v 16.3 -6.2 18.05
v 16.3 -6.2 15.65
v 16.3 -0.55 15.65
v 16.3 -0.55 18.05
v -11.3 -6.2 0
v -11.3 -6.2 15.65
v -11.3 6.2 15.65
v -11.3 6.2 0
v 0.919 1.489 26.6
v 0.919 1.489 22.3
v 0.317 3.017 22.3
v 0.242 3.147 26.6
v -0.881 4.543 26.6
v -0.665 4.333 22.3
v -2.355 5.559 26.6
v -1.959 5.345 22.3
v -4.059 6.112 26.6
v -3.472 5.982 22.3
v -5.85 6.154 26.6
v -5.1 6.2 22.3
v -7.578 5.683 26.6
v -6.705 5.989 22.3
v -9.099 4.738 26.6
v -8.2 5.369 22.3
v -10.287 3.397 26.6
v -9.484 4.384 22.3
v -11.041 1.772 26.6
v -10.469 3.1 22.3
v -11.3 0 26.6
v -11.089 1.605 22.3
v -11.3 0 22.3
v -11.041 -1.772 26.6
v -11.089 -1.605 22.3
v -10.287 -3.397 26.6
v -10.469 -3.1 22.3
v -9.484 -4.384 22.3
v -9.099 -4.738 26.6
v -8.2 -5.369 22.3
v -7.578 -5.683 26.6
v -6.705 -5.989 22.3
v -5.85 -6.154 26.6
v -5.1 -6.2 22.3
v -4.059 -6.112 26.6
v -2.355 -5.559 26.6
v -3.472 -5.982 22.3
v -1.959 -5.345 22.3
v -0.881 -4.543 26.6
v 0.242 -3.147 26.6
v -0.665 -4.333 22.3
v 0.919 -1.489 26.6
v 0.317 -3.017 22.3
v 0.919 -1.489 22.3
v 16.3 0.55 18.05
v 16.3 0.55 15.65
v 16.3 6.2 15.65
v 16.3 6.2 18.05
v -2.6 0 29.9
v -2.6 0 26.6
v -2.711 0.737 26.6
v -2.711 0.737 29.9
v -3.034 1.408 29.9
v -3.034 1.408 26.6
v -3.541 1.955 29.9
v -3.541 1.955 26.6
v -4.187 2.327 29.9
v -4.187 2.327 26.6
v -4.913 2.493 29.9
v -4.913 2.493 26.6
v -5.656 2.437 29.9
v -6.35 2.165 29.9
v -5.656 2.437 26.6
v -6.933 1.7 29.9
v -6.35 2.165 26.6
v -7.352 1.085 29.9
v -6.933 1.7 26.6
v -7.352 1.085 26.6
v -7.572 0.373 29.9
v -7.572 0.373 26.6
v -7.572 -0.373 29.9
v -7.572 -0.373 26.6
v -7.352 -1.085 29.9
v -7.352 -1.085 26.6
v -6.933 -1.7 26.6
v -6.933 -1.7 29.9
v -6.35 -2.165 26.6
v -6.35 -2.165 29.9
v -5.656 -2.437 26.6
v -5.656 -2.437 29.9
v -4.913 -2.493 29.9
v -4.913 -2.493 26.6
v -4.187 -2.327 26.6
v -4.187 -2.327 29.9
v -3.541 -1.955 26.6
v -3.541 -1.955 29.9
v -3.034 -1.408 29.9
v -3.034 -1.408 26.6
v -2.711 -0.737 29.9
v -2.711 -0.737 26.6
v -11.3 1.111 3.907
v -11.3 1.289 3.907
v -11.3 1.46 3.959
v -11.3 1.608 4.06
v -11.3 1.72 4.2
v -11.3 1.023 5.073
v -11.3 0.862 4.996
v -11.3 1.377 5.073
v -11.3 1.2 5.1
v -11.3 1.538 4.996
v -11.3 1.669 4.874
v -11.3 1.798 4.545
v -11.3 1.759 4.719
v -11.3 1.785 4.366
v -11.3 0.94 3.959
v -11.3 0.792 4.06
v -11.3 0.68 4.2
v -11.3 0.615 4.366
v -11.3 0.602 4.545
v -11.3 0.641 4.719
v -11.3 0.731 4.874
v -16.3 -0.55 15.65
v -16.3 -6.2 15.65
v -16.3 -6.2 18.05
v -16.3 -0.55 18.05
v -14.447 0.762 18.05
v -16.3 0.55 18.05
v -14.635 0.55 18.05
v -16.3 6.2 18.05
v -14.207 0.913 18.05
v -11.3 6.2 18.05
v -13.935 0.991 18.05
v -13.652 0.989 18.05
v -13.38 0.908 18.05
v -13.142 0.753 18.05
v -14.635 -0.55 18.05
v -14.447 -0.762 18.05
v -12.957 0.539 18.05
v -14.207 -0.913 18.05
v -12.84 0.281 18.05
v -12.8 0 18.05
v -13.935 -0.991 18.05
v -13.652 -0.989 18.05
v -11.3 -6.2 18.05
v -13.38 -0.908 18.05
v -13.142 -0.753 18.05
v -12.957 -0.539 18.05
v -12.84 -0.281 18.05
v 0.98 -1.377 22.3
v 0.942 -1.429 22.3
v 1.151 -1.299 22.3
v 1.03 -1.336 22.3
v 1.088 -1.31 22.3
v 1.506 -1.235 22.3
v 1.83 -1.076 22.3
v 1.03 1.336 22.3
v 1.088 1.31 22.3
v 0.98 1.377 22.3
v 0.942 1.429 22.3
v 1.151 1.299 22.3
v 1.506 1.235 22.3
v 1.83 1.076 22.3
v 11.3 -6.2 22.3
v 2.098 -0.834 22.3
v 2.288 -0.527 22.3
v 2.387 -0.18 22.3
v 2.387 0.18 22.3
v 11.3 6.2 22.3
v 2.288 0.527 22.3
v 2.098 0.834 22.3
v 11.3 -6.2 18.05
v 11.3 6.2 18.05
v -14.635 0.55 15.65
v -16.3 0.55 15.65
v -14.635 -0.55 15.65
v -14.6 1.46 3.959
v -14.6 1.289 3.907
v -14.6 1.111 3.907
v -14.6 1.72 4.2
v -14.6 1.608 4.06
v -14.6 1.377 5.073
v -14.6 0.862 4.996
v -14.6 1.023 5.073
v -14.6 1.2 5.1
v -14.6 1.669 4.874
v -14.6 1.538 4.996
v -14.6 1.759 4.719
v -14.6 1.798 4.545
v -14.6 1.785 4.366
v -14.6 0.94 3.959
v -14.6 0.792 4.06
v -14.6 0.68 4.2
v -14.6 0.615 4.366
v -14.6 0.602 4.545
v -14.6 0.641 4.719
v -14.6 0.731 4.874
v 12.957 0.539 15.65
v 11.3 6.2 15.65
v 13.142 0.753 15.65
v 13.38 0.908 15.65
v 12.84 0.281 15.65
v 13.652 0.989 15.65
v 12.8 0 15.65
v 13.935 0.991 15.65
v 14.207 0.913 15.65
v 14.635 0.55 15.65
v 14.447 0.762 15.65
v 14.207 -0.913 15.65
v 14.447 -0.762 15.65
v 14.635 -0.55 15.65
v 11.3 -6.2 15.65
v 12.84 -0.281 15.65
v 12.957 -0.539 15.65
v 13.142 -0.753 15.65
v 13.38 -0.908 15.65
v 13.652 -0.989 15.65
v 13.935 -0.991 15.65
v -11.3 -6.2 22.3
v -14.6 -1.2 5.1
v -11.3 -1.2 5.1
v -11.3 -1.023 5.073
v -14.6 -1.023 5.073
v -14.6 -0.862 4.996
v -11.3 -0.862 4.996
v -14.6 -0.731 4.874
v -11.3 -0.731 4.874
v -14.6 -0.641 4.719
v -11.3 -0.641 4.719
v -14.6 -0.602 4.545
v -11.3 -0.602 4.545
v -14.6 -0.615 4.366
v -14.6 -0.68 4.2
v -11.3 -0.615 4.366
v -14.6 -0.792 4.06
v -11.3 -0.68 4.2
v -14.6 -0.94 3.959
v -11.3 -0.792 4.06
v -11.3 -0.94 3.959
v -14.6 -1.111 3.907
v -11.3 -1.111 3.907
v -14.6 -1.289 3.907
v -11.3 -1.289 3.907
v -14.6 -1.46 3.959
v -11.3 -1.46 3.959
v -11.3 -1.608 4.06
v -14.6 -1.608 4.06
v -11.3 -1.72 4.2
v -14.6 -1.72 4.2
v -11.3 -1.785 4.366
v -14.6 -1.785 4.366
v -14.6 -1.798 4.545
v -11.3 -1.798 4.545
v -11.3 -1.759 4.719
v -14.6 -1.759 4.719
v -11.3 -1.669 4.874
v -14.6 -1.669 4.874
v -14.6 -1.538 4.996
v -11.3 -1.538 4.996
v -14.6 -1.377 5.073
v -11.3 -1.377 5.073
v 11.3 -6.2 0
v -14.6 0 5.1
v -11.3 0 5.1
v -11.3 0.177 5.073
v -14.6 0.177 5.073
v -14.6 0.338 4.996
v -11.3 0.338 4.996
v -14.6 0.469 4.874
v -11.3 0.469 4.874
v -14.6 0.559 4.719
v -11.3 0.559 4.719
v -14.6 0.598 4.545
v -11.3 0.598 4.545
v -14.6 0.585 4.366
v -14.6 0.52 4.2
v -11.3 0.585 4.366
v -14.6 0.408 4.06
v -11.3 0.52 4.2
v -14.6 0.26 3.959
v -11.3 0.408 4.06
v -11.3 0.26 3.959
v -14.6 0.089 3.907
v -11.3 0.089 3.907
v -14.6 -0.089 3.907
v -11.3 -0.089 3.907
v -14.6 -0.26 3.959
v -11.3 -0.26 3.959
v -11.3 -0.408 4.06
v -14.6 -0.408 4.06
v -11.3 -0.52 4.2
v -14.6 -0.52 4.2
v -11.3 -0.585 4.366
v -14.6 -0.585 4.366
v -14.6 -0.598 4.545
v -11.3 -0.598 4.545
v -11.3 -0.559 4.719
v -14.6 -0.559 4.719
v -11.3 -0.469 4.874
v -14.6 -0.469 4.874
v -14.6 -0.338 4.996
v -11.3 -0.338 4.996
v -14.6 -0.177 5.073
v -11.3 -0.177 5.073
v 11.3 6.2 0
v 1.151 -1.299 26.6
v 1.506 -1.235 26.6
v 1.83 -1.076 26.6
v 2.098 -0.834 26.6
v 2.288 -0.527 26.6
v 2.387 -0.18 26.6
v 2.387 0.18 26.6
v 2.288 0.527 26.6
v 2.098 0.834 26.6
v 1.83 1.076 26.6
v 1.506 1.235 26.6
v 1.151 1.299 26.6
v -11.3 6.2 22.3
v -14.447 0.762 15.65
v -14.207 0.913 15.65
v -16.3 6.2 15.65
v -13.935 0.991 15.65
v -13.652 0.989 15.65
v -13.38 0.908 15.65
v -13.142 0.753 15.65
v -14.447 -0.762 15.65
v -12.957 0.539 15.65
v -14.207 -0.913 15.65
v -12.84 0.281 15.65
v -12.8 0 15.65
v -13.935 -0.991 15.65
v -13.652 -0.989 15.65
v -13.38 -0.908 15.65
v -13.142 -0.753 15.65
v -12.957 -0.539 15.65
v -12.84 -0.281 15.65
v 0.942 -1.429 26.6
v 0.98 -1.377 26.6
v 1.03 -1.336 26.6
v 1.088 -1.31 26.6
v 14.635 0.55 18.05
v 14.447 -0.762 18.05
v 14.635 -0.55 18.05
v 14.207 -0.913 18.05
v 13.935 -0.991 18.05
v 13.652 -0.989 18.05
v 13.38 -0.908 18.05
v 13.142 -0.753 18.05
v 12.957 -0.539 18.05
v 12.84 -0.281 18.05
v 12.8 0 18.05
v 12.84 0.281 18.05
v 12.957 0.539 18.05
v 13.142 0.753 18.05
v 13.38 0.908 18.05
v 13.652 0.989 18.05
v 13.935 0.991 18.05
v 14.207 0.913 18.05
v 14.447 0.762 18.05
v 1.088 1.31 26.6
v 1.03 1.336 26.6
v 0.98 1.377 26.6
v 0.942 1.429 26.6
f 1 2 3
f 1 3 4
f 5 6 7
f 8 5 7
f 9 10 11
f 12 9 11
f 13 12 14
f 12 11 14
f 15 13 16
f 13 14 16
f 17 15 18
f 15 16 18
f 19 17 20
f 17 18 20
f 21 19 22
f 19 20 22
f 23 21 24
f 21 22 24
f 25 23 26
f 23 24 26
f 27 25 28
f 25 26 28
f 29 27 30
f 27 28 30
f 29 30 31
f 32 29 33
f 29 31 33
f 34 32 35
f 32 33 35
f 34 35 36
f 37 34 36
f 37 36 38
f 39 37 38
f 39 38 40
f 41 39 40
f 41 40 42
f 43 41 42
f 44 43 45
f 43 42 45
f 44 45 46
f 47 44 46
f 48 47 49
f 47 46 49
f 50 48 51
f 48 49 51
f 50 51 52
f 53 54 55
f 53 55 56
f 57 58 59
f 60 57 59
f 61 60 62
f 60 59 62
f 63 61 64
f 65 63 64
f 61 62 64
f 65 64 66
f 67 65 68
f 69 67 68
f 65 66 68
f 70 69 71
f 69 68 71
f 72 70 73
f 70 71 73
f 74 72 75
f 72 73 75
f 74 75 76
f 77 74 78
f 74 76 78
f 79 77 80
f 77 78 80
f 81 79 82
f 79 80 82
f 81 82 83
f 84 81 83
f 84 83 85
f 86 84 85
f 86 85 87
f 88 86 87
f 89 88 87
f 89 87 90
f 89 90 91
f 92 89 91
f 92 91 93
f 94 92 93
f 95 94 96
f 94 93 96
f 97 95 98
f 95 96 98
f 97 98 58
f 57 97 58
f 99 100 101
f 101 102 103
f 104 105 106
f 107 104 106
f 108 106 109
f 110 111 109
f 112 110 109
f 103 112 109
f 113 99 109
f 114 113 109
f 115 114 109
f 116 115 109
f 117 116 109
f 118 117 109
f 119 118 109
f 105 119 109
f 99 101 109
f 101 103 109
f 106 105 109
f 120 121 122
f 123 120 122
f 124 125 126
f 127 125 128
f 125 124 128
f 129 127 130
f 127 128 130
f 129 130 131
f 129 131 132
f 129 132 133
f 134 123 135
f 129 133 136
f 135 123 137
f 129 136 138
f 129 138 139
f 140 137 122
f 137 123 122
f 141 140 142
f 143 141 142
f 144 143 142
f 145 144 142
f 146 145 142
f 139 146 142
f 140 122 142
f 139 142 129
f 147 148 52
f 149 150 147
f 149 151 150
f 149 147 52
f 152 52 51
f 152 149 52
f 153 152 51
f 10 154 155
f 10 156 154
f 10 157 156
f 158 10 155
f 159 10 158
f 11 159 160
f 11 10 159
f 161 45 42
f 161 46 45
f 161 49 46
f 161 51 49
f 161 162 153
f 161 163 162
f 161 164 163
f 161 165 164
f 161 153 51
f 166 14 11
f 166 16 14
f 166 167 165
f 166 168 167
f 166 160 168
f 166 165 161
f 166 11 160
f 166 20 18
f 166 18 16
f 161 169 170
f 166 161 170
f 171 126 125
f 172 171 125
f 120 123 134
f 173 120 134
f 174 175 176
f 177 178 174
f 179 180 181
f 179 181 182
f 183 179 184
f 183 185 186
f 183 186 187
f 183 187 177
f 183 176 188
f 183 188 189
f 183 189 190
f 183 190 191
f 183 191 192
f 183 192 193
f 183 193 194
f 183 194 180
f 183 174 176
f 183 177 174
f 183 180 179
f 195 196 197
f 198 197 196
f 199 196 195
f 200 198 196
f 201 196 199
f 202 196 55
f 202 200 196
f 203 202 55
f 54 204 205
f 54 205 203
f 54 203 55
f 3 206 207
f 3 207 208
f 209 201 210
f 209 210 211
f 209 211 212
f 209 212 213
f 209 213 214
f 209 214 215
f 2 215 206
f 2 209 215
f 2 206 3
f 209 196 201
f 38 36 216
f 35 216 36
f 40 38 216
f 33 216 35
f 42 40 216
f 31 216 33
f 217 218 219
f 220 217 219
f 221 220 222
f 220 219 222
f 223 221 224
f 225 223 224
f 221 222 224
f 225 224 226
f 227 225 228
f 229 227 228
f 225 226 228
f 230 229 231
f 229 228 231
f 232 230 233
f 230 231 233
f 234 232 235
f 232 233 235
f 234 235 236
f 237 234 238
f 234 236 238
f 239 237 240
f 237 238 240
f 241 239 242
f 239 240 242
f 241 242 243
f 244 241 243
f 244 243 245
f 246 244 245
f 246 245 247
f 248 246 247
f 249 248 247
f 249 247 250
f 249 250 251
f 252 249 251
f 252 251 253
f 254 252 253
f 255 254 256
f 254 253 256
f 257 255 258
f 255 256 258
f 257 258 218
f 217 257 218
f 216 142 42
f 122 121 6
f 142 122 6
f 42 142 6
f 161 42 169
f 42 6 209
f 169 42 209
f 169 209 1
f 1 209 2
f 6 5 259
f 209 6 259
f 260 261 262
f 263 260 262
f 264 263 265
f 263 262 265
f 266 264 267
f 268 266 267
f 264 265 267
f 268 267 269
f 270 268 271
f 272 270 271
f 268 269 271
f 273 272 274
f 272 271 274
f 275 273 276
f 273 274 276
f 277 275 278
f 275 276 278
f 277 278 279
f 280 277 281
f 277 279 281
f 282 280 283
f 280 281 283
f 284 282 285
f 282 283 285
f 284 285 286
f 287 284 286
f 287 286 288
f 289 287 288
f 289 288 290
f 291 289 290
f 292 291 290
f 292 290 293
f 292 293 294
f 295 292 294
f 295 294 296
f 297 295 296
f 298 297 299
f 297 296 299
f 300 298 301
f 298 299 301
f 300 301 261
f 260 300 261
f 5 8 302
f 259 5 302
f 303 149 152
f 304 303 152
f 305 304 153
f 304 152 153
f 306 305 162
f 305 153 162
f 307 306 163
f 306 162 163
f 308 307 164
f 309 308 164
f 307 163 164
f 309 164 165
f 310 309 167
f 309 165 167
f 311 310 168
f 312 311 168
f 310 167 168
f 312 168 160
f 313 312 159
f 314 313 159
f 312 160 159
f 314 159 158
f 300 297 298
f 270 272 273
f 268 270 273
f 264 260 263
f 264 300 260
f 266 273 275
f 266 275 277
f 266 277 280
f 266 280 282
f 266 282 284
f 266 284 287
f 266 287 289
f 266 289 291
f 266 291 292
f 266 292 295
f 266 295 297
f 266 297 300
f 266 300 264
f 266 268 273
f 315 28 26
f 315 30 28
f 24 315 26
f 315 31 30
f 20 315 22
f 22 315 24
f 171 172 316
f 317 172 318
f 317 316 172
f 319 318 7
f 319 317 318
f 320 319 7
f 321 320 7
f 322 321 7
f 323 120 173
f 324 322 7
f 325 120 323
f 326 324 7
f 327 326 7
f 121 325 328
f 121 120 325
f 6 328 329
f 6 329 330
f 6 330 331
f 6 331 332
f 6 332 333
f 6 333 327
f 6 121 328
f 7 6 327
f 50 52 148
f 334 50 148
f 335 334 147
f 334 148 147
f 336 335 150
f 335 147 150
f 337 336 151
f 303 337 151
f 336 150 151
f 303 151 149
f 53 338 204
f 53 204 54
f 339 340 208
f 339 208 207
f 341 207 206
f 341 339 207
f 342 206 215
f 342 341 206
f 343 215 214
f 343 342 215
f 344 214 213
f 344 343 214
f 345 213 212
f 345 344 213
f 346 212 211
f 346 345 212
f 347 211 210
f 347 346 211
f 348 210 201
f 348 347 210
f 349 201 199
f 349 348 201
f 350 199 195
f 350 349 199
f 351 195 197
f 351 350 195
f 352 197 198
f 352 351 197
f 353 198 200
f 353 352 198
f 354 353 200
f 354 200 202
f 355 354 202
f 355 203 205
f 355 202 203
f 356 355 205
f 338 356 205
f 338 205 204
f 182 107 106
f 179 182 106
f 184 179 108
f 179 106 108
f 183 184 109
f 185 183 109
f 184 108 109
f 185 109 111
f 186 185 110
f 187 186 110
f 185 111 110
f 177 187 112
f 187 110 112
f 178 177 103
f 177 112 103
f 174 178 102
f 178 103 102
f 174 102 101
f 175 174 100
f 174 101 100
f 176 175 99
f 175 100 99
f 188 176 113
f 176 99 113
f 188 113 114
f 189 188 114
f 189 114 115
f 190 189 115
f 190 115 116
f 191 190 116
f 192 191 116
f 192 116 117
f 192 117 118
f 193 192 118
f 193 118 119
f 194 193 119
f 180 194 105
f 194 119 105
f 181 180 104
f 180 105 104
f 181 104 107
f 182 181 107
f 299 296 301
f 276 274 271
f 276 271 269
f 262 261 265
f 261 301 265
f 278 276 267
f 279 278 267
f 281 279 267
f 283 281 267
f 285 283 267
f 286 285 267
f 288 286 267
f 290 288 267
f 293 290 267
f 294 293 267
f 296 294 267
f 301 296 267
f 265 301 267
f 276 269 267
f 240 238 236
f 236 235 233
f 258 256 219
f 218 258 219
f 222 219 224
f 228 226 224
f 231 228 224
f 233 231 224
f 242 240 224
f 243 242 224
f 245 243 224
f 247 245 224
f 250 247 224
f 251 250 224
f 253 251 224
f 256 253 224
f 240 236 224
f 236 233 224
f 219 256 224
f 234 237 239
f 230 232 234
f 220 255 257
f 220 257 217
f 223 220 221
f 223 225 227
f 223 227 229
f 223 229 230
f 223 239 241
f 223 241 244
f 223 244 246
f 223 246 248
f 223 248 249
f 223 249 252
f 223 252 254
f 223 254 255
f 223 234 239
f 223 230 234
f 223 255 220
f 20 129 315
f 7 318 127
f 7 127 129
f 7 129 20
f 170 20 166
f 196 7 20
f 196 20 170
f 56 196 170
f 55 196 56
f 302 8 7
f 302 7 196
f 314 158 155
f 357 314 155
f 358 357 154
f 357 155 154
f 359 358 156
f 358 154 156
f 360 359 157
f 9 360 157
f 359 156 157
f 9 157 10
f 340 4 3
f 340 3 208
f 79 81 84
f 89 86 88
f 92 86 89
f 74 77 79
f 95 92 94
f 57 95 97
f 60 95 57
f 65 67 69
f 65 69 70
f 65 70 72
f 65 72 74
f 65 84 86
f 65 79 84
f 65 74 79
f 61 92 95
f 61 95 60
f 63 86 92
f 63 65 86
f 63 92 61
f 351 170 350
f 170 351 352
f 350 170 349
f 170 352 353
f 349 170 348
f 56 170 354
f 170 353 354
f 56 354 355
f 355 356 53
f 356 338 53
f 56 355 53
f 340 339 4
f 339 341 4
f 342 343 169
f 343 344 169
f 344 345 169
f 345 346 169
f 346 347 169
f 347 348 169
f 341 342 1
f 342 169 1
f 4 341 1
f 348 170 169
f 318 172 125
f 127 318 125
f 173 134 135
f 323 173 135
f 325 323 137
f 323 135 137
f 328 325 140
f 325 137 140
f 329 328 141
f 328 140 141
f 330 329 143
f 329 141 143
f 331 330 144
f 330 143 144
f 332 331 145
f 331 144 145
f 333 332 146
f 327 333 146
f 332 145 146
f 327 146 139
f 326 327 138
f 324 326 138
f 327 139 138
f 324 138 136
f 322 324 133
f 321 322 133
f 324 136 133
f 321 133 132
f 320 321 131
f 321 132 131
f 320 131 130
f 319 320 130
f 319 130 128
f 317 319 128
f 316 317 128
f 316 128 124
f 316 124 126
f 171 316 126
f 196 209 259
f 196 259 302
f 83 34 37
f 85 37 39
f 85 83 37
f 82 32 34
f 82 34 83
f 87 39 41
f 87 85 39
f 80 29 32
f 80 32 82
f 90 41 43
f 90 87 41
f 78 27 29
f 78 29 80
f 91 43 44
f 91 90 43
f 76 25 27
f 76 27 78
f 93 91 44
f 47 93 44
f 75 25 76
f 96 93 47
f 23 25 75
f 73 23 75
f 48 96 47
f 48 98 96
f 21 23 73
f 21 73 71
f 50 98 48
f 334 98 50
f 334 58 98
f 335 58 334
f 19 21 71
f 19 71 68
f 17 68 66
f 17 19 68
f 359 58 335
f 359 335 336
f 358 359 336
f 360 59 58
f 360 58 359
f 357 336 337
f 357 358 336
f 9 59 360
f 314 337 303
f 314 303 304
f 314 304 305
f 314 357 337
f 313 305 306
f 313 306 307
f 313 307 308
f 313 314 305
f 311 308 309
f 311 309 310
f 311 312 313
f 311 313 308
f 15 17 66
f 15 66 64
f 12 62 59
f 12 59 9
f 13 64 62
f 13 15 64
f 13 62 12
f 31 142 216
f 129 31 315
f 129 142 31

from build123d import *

# Parameters (mm, degrees)
SKETCH1_W             = 22.6
SKETCH1_H             = 12.4
BOSS_EXTRUDE1_DEPTH   = 22.3
SKETCH2_W             = 5
SKETCH2_H             = 2.4
BOSS_EXTRUDE2_DEPTH   = 12.4
CUT_EXTRUDE1_DEPTH    = 22.3
BOSS_EXTRUDE3_DEPTH   = 4.3
SKETCH6_R             = 2.5
BOSS_EXTRUDE4_DEPTH   = 3.3
SKETCH7_R             = 0.6
BOSS_EXTRUDE5_DEPTH   = 3.3
BOSS_EXTRUDE5_2_DEPTH = 3.3
BOSS_EXTRUDE5_3_DEPTH = 3.3


with BuildPart() as part:
    # Sketch1 → Boss-Extrude1 (new body)
    with BuildSketch(Plane.XY):
        Rectangle(SKETCH1_W, SKETCH1_H)
    extrude(amount=BOSS_EXTRUDE1_DEPTH)

    # Sketch2 → Boss-Extrude2 (add)
    with BuildSketch(Plane.XZ.offset(6.2)):
        with Locations((13.8, 16.85)):
            Rectangle(SKETCH2_W, SKETCH2_H)
        with Locations((-13.8, 16.85)):
            Rectangle(SKETCH2_W, SKETCH2_H)
    extrude(amount=-BOSS_EXTRUDE2_DEPTH)

    # Sketch3 → Cut-Extrude1 (cut)
    with BuildSketch(Plane.XY.offset(18.05)):
        with BuildLine():
            Line((14.635164654, 0.55), (16.3, 0.55))
            Line((16.3, 0.55), (16.3, -0.55))
            Line((16.3, -0.55), (14.635164654, -0.55))
            ThreePointArc((14.635164654, -0.55), (12.8, 0), (14.635164654, 0.55))
        make_face()
        with BuildLine():
            Line((-16.3, -0.55), (-14.635164654, -0.55))
            ThreePointArc((-14.635164654, -0.55), (-12.8, 0), (-14.635164654, 0.55))
            Line((-14.635164654, 0.55), (-16.3, 0.55))
            Line((-16.3, 0.55), (-16.3, -0.55))
        make_face()
    extrude(amount=-CUT_EXTRUDE1_DEPTH, mode=Mode.SUBTRACT)

    # Sketch4 → Boss-Extrude3 (add)
    with BuildSketch(Plane.XY.offset(22.3)):
        with BuildLine():
            ThreePointArc((0.918604651, 1.488757218), (-11.3, 0), (0.918604651, -1.488757218))
            ThreePointArc((0.918604651, -1.488757218), (1.003329596, -1.355013632), (1.151404787, -1.298983275))
            ThreePointArc((1.151404787, -1.298983275), (2.4, 0), (1.151404787, 1.298983275))
            ThreePointArc((1.151404787, 1.298983275), (1.003329596, 1.355013632), (0.918604651, 1.488757218))
        make_face()
    extrude(amount=BOSS_EXTRUDE3_DEPTH)

    # Sketch6 → Boss-Extrude4 (add)
    with BuildSketch(Plane.XY.offset(26.6)):
        with Locations((-5.1, 0)):
            Circle(SKETCH6_R)
    extrude(amount=BOSS_EXTRUDE4_DEPTH)


with BuildPart() as body_2:
    # Sketch7 → Boss-Extrude5 (new body)
    with BuildSketch(Plane.ZY.offset(11.3)):
        with Locations((4.5, 1.2)):
            Circle(SKETCH7_R)
    extrude(amount=BOSS_EXTRUDE5_DEPTH)


with BuildPart() as body_3:
    # Sketch7 → Boss-Extrude5 2 (new body)
    with BuildSketch(Plane.ZY.offset(11.3)):
        with Locations((4.5, 0)):
            Circle(SKETCH7_R)
    extrude(amount=BOSS_EXTRUDE5_2_DEPTH)


with BuildPart() as body_4:
    # Sketch7 → Boss-Extrude5 3 (new body)
    with BuildSketch(Plane.ZY.offset(11.3)):
        with Locations((4.5, -1.2)):
            Circle(SKETCH7_R)
    extrude(amount=BOSS_EXTRUDE5_3_DEPTH)


solid = Compound([part.part, body_2.part, body_3.part, body_4.part])
